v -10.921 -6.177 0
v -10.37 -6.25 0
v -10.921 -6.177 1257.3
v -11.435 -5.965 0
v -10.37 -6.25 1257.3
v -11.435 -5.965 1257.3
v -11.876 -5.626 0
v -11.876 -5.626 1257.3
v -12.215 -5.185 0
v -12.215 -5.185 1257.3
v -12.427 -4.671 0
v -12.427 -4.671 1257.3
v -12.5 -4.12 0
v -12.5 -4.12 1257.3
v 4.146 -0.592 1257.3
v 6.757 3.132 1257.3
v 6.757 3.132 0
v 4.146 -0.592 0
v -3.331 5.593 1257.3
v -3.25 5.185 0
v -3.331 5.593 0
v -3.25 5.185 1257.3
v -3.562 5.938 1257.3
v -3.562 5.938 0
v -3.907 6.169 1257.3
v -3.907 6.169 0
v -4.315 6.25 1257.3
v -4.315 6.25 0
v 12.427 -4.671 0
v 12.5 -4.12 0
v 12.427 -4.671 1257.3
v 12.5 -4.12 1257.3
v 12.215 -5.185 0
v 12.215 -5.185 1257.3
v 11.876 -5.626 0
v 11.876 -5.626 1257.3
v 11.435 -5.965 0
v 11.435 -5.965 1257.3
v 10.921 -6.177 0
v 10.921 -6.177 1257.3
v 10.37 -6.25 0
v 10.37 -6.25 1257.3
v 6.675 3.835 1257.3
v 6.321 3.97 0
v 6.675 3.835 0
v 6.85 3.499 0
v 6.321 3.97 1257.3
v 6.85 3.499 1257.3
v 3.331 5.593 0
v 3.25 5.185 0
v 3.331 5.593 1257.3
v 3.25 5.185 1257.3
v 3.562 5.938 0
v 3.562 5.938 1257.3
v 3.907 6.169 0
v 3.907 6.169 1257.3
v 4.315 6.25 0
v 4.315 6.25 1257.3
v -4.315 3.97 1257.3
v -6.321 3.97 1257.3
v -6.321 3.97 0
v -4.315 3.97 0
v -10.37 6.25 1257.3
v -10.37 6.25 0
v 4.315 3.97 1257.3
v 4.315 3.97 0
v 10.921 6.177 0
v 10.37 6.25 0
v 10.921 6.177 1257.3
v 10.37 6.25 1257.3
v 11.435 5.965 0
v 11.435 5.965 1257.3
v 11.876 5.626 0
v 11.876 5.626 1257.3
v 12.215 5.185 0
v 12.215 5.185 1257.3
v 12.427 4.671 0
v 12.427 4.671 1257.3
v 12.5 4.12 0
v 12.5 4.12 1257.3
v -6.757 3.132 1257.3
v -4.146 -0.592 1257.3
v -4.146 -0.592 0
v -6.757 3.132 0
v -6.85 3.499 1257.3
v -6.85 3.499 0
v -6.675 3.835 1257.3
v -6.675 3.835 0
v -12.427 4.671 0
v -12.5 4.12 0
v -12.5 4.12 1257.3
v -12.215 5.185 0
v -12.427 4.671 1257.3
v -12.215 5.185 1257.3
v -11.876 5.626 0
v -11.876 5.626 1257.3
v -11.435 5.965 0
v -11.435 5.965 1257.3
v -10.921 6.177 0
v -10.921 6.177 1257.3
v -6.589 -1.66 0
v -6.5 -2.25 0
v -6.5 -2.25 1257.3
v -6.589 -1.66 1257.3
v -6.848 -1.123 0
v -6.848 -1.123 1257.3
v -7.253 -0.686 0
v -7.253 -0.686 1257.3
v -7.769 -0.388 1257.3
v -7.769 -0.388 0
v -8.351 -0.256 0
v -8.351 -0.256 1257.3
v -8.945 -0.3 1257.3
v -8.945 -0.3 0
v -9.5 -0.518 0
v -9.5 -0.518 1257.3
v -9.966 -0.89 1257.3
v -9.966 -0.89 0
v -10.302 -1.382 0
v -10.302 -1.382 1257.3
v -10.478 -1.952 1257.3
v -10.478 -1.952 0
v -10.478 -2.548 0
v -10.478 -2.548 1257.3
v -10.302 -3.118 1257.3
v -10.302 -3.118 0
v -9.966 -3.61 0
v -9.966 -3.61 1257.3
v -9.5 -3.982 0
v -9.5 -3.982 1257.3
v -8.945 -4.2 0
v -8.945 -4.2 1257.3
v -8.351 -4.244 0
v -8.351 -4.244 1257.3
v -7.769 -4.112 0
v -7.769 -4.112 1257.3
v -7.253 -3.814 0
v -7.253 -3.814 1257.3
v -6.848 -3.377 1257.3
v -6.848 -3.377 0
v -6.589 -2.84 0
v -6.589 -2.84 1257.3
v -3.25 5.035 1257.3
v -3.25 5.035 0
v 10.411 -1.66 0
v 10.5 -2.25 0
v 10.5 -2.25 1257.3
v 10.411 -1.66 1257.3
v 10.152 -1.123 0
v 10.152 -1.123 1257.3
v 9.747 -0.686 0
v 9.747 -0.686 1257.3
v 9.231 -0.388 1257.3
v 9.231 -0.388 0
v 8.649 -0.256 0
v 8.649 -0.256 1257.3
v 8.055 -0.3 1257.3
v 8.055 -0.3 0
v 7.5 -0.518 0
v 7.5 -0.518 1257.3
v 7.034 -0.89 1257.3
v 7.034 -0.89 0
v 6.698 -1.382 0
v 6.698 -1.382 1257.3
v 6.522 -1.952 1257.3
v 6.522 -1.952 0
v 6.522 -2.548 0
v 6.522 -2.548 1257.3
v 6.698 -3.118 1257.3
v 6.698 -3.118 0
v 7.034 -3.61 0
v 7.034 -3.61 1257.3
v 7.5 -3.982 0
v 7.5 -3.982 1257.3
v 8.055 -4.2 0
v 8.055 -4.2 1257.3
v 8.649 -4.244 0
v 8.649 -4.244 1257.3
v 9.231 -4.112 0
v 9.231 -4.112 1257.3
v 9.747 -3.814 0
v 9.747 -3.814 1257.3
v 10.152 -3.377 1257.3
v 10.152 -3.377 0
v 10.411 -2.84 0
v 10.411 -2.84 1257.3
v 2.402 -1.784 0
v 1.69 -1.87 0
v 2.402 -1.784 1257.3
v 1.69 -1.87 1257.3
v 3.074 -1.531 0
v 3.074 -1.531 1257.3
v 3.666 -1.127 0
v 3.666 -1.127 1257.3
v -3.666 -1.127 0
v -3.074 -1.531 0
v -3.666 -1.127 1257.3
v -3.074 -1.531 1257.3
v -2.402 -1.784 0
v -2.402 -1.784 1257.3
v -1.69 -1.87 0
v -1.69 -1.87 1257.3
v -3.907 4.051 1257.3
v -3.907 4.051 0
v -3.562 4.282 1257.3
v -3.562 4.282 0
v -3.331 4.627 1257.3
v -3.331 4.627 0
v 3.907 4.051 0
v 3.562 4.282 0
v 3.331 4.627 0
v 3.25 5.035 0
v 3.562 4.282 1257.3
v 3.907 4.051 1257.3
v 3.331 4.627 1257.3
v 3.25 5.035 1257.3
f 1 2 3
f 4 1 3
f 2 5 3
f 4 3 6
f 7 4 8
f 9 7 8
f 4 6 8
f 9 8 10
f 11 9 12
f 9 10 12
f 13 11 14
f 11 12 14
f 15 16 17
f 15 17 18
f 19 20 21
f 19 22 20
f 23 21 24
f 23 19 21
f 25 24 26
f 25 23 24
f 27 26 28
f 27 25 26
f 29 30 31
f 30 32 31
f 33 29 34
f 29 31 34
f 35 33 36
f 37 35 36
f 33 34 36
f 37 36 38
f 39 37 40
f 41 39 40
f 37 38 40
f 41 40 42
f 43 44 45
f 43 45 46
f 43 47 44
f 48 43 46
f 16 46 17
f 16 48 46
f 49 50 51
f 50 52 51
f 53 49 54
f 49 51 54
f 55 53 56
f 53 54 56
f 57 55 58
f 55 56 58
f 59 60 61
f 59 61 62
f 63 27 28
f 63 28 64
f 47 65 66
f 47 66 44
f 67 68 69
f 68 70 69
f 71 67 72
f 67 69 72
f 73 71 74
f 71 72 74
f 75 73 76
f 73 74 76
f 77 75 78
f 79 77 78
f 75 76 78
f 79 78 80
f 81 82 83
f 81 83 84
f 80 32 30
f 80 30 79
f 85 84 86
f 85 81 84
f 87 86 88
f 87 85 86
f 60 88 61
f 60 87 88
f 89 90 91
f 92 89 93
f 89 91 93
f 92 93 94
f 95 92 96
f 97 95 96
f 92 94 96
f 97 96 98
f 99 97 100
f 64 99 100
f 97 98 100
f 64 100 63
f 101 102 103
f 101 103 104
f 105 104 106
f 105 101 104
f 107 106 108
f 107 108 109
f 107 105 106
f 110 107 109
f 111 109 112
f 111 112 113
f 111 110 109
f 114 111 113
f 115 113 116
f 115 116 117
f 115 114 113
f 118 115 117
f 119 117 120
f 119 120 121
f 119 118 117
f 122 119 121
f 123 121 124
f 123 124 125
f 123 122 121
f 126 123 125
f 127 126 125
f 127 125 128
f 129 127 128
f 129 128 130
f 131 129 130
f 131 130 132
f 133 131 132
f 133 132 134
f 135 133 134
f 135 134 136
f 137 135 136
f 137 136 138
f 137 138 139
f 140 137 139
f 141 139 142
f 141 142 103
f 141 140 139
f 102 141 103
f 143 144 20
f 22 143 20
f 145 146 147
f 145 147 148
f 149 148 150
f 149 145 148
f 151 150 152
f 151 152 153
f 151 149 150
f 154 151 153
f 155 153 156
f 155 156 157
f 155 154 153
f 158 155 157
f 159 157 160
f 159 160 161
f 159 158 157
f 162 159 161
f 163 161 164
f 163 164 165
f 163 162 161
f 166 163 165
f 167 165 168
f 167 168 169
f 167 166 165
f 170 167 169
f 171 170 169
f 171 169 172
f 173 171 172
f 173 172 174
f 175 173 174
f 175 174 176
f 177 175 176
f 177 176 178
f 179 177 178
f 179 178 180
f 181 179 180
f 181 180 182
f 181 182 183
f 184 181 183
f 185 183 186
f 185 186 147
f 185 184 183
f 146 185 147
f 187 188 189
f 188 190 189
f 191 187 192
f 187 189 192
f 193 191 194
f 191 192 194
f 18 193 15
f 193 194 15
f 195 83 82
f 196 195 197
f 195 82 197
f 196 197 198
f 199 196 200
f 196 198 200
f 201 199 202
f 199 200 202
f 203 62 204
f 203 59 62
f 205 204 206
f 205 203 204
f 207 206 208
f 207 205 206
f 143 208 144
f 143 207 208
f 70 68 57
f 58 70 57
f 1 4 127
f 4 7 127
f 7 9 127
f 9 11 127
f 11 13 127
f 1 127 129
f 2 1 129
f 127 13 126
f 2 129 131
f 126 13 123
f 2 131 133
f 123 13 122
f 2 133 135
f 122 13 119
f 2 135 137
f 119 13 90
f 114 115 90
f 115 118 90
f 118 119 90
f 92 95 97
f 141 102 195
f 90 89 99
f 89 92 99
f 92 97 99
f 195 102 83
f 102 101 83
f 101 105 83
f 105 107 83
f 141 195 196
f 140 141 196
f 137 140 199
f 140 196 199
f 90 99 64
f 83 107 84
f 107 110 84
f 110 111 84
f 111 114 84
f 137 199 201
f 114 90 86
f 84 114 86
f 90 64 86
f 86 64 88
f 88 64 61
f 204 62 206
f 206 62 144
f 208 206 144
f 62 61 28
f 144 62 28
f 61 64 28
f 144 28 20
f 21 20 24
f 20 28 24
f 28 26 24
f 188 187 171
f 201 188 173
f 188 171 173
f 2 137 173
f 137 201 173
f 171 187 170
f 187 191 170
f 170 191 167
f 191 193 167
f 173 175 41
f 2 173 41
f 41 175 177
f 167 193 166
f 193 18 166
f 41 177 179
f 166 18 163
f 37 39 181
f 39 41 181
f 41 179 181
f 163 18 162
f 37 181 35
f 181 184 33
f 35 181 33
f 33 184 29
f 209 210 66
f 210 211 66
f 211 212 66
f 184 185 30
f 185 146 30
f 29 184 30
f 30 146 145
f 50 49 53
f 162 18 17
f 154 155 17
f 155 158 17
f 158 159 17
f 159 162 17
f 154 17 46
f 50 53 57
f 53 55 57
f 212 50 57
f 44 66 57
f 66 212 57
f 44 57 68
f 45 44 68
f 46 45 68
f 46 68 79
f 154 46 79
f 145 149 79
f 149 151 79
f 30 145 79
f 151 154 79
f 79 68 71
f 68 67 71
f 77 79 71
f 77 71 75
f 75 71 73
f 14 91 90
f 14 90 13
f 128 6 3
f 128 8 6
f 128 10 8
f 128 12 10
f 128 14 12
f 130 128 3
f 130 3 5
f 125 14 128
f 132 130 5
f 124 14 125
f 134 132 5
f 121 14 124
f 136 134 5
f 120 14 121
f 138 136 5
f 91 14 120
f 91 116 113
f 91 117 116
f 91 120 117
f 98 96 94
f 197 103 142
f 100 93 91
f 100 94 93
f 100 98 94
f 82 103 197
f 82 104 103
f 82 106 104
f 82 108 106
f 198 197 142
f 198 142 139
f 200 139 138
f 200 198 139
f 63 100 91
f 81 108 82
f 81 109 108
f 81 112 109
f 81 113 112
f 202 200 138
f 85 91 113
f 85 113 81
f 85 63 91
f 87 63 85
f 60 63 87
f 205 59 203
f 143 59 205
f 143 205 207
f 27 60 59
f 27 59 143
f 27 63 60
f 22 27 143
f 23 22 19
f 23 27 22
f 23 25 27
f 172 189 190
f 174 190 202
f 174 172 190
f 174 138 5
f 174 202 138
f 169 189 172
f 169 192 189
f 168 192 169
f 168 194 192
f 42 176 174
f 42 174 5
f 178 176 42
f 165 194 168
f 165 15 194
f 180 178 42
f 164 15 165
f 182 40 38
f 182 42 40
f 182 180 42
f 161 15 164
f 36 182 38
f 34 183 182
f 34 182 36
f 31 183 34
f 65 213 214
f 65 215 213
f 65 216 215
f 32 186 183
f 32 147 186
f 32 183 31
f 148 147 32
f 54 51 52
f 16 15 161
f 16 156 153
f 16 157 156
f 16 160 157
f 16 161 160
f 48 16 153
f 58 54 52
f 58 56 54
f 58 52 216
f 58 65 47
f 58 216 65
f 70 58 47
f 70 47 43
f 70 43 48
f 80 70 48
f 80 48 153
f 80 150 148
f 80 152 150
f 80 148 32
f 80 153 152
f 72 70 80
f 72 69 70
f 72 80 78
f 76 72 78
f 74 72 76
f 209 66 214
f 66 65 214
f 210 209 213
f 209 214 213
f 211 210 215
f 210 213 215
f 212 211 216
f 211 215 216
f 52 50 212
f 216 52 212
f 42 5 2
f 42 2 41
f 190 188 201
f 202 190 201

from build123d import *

# Parameters (mm, degrees)
SKETCH1_R           = 2
BOSS_EXTRUDE2_DEPTH = 1257.3
FILLET1_R           = 1.065
FILLET4_R           = 2.13
FILLET5_R           = 2.13
FILLET8_R           = 0.5325
FILLET11_R          = 0.5325
FILLET15_R          = 3
FILLET16_R          = 3


with BuildPart() as part:
    # Sketch1 → Boss-Extrude2 (new body)
    with BuildSketch(Plane.XY):
        Polygon((7.345, 3.97), (3.25, -1.87), (-3.25, -1.87), (-7.345, 3.97), (-3.25, 3.97), (-3.25, 6.25), (-12.5, 6.25), (-12.5, -6.25), (12.5, -6.25), (12.5, 6.25), (3.25, 6.25), (3.25, 3.97), align=None)
        with Locations((-8.5, -2.25)):
            Circle(SKETCH1_R, mode=Mode.SUBTRACT)
        with Locations((8.5, -2.25)):
            Circle(SKETCH1_R, mode=Mode.SUBTRACT)
    extrude(amount=BOSS_EXTRUDE2_DEPTH)

    # Fillet1
    fillet1_edges = [part.edges().sort_by_distance(p)[0] for p in [
        (3.25, 3.97, 628.65),
        (3.25, 6.25, 628.65),
        (-3.25, 6.25, 628.65),
        (-3.25, 3.97, 628.65),
    ]]
    fillet(fillet1_edges, radius=FILLET1_R)

    # Fillet4
    fillet4_edges = [part.edges().sort_by_distance(p)[0] for p in [
        (12.5, 6.25, 628.65),
    ]]
    fillet(fillet4_edges, radius=FILLET4_R)

    # Fillet5
    fillet5_edges = [part.edges().sort_by_distance(p)[0] for p in [
        (12.5, -6.25, 628.65),
        (-12.5, -6.25, 628.65),
        (-12.5, 6.25, 628.65),
    ]]
    fillet(fillet5_edges, radius=FILLET5_R)

    # Fillet8
    fillet8_edges = [part.edges().sort_by_distance(p)[0] for p in [
        (7.345, 3.97, 628.65),
    ]]
    fillet(fillet8_edges, radius=FILLET8_R)

    # Fillet11
    fillet11_edges = [part.edges().sort_by_distance(p)[0] for p in [
        (-7.345, 3.97, 628.65),
    ]]
    fillet(fillet11_edges, radius=FILLET11_R)

    # Fillet15
    fillet15_edges = [part.edges().sort_by_distance(p)[0] for p in [
        (-3.25, -1.87, 628.65),
    ]]
    fillet(fillet15_edges, radius=FILLET15_R)

    # Fillet16
    fillet16_edges = [part.edges().sort_by_distance(p)[0] for p in [
        (3.25, -1.87, 628.65),
    ]]
    fillet(fillet16_edges, radius=FILLET16_R)


solid = part.part
